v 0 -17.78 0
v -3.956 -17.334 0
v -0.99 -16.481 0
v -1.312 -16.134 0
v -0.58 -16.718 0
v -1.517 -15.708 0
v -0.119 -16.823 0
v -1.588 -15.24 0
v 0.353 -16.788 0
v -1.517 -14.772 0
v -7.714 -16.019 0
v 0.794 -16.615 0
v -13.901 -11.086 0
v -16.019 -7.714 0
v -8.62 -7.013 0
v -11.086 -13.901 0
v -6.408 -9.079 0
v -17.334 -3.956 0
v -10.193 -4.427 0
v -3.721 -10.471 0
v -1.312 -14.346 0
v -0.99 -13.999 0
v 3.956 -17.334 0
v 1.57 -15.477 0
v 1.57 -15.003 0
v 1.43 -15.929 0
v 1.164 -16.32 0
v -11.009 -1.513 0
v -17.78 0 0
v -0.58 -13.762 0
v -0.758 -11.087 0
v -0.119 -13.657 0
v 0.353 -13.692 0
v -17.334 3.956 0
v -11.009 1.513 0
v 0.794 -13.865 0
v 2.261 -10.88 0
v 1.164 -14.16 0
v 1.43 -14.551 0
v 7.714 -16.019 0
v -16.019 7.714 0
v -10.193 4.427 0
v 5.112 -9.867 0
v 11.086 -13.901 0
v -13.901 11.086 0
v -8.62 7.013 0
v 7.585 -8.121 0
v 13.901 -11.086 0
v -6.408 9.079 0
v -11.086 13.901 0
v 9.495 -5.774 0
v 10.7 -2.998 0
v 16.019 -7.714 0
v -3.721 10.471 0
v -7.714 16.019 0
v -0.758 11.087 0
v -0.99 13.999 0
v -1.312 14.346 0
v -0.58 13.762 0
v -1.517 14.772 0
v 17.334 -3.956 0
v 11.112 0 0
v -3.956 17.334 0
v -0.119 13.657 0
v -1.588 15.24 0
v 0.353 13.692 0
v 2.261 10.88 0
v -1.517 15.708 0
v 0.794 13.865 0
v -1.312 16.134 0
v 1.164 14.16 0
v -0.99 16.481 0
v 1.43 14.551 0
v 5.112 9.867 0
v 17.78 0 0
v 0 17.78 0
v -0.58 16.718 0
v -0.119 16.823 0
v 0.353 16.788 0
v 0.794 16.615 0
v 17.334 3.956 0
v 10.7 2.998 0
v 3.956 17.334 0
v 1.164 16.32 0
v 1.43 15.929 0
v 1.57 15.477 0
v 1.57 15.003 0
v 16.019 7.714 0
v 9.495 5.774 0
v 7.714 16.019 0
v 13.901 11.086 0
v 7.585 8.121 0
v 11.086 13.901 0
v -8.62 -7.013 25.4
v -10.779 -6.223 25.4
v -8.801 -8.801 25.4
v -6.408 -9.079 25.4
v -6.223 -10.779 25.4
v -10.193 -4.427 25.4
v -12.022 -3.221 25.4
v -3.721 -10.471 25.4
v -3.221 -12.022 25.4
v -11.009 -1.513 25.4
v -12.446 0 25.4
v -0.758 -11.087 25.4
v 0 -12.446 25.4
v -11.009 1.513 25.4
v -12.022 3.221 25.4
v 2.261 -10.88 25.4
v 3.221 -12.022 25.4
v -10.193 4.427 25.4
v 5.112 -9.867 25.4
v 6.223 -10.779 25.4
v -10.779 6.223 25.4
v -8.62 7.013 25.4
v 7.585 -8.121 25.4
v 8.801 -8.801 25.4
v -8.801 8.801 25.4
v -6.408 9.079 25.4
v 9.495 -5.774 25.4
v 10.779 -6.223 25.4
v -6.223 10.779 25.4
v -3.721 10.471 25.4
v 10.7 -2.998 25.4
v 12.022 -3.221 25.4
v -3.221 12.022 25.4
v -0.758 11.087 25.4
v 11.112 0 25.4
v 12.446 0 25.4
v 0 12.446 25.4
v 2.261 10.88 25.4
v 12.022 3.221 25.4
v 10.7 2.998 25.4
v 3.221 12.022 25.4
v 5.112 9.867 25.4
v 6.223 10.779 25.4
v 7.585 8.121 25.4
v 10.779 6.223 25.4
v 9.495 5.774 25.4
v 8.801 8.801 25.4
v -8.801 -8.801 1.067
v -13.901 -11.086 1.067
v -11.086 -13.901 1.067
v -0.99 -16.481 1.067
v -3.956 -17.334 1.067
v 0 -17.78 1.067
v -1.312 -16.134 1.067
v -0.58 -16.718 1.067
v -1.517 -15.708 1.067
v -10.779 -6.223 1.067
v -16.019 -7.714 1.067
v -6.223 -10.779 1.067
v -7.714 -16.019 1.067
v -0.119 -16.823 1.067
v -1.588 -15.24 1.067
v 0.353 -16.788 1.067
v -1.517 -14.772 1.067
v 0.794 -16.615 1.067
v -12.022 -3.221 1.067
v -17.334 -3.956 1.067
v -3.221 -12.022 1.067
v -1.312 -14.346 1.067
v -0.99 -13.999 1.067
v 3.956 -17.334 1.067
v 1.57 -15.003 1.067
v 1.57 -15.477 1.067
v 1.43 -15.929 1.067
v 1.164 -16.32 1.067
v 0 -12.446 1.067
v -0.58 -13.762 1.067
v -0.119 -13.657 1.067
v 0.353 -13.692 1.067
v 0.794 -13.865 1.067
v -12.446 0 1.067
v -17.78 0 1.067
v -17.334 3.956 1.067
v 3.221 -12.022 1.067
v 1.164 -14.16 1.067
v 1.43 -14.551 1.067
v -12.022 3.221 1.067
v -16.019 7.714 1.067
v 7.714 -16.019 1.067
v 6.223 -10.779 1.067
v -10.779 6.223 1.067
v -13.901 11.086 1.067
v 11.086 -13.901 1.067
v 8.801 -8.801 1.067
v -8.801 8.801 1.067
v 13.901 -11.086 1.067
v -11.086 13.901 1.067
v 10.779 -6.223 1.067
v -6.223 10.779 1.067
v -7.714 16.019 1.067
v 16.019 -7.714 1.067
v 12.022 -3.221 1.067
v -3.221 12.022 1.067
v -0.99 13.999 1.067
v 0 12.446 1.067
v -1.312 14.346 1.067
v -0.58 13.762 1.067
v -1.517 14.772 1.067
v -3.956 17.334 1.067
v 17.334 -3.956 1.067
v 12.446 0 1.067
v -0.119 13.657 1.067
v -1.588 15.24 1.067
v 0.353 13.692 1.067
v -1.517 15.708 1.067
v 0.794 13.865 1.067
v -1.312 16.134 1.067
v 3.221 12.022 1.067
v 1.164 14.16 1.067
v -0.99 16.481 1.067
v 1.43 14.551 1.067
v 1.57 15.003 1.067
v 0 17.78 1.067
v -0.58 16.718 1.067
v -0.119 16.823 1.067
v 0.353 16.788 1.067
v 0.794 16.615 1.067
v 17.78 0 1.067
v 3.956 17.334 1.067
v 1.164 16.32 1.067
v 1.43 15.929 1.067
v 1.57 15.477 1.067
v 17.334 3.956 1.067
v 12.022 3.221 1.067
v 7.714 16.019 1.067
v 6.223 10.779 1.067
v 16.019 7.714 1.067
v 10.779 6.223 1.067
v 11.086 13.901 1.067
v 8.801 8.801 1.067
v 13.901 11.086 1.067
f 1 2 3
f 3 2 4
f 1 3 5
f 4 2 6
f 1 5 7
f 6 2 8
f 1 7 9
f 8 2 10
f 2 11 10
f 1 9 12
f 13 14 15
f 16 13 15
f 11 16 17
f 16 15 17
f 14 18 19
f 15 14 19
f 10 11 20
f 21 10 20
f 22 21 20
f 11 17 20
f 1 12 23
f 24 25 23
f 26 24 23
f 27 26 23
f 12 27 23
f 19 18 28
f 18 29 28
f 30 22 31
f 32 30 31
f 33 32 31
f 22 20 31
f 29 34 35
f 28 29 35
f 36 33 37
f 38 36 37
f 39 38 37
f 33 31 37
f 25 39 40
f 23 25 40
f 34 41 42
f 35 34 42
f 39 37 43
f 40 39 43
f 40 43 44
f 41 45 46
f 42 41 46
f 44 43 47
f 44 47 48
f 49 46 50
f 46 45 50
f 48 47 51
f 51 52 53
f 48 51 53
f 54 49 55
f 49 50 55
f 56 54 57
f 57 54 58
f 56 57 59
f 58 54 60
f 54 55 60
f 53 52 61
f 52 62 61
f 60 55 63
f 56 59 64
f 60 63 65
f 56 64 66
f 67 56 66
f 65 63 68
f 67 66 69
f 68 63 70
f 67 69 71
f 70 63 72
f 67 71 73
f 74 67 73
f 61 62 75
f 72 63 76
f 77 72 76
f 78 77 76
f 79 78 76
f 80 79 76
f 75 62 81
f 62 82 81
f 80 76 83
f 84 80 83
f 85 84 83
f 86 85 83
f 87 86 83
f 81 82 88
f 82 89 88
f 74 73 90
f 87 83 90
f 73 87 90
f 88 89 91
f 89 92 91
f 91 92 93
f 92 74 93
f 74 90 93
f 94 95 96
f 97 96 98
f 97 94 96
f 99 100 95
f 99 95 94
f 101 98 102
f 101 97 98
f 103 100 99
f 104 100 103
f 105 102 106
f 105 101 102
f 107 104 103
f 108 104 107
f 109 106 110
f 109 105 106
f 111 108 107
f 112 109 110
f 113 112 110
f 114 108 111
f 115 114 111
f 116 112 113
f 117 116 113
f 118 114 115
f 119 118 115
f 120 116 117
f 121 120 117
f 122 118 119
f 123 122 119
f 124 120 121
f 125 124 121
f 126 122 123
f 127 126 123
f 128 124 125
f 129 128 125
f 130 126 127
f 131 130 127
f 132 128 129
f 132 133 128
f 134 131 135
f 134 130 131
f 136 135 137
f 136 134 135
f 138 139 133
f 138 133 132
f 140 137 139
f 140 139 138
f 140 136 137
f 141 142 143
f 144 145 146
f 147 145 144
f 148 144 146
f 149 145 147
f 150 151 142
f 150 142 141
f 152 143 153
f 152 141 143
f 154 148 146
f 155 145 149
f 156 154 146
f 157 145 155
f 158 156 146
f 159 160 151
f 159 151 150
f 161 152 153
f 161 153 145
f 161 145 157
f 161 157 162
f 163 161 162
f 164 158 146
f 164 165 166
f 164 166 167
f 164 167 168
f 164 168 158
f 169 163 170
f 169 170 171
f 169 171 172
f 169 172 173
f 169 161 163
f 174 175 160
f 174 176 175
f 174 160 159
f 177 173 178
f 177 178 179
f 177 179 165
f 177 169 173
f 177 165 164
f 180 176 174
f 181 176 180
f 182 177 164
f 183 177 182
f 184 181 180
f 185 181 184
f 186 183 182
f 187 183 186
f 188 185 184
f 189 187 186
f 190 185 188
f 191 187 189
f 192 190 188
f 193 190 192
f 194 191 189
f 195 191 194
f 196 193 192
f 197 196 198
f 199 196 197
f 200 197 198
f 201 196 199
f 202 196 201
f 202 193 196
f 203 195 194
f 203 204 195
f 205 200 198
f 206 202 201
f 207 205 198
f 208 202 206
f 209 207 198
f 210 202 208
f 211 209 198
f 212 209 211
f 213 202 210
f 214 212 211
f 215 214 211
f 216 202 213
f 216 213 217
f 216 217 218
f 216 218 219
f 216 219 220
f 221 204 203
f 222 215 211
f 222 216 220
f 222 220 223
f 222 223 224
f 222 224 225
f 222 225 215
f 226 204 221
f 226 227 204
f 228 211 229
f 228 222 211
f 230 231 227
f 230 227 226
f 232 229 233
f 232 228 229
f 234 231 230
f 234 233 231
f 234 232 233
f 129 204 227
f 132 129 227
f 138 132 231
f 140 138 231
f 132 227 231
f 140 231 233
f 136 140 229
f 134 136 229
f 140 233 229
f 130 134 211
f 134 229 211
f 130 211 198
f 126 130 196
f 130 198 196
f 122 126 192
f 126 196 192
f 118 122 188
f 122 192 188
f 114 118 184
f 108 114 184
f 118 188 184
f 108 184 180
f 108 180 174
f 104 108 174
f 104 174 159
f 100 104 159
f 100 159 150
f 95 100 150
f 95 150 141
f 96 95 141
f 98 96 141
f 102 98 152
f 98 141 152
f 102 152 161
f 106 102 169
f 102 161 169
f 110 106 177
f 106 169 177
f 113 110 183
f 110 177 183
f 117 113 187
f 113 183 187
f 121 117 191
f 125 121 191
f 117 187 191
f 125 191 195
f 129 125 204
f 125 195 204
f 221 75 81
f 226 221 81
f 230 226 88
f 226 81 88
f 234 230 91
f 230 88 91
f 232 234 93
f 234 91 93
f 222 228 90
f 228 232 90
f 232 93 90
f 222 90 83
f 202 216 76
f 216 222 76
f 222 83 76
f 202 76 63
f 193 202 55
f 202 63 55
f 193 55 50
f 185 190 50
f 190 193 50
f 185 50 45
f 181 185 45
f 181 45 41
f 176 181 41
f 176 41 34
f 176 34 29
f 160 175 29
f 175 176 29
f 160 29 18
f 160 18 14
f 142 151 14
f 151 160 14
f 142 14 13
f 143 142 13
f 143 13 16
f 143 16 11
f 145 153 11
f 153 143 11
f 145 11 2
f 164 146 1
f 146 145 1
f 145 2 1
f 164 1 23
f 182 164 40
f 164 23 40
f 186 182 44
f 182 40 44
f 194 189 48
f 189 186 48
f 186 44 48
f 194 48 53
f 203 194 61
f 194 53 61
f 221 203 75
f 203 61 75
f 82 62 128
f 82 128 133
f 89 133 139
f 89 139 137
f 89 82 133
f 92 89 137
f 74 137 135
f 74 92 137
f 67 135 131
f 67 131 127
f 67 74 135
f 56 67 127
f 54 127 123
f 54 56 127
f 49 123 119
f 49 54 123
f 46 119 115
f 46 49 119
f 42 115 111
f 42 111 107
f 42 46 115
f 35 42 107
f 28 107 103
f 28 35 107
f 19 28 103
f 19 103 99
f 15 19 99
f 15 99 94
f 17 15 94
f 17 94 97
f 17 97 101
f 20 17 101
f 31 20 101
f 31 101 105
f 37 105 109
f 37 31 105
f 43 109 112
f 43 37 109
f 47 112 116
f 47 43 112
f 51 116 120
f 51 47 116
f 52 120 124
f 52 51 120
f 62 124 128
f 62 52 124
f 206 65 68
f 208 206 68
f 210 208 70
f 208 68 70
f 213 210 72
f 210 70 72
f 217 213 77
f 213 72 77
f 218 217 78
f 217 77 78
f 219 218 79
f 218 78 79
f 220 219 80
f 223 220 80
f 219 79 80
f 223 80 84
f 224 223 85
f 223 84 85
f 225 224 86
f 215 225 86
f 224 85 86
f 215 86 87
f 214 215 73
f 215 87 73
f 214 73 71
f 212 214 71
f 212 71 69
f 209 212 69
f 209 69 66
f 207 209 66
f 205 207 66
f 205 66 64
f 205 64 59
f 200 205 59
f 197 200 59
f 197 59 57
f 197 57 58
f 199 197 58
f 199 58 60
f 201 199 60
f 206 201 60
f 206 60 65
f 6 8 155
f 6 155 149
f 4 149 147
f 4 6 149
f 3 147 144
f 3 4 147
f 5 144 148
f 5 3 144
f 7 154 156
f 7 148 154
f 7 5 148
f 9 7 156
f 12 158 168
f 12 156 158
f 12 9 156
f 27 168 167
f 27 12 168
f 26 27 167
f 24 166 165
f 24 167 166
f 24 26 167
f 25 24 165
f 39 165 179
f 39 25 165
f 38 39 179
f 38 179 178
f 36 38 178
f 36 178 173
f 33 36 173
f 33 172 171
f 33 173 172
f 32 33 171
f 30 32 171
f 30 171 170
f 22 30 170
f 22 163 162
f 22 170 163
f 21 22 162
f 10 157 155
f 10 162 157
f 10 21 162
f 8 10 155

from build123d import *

# Parameters (mm, degrees)
SKETCH1_R                    = 17.78
SKETCH1_R_2                  = 11.1125
BOSS_EXTRUDE1_DEPTH          = 25.4
CUT_EXTRUDE1_START           = -24.3332
SKETCH2_OUTSIDE_W            = 48.828
SKETCH2_OUTSIDE_H            = 48.828
SKETCH2_OUTSIDE_R            = 12.446
CUT_EXTRUDE1_DEPTH           = 24.3332
F_1_8_0_125_DIAMETER_HOLE1_D = 3.175


with BuildPart() as part:
    # Sketch1 → Boss-Extrude1 (new body)
    with BuildSketch(Plane.XY):
        Circle(SKETCH1_R)
        Circle(SKETCH1_R_2, mode=Mode.SUBTRACT)
    extrude(amount=BOSS_EXTRUDE1_DEPTH)

    # Sketch2 outside → Cut-Extrude1 (cut)
    with BuildSketch(Plane.XY.offset(25.4).offset(CUT_EXTRUDE1_START)):
        Rectangle(SKETCH2_OUTSIDE_W, SKETCH2_OUTSIDE_H)
        Circle(SKETCH2_OUTSIDE_R, mode=Mode.SUBTRACT)
    extrude(amount=CUT_EXTRUDE1_DEPTH, mode=Mode.SUBTRACT)

    # 1/8 (0.125) Diameter Hole1 (through all)
    with Locations(Plane.XY.offset(1.0668)):
        with Locations((0, 15.24)):
            f_1_8_0_125_diameter_hole1 = Hole(F_1_8_0_125_DIAMETER_HOLE1_D / 2)

    # Mirror1: 1/8 (0.125) Diameter Hole1 across plane
    add(f_1_8_0_125_diameter_hole1.mirror(Plane.ZX), mode=Mode.SUBTRACT)


solid = part.part
